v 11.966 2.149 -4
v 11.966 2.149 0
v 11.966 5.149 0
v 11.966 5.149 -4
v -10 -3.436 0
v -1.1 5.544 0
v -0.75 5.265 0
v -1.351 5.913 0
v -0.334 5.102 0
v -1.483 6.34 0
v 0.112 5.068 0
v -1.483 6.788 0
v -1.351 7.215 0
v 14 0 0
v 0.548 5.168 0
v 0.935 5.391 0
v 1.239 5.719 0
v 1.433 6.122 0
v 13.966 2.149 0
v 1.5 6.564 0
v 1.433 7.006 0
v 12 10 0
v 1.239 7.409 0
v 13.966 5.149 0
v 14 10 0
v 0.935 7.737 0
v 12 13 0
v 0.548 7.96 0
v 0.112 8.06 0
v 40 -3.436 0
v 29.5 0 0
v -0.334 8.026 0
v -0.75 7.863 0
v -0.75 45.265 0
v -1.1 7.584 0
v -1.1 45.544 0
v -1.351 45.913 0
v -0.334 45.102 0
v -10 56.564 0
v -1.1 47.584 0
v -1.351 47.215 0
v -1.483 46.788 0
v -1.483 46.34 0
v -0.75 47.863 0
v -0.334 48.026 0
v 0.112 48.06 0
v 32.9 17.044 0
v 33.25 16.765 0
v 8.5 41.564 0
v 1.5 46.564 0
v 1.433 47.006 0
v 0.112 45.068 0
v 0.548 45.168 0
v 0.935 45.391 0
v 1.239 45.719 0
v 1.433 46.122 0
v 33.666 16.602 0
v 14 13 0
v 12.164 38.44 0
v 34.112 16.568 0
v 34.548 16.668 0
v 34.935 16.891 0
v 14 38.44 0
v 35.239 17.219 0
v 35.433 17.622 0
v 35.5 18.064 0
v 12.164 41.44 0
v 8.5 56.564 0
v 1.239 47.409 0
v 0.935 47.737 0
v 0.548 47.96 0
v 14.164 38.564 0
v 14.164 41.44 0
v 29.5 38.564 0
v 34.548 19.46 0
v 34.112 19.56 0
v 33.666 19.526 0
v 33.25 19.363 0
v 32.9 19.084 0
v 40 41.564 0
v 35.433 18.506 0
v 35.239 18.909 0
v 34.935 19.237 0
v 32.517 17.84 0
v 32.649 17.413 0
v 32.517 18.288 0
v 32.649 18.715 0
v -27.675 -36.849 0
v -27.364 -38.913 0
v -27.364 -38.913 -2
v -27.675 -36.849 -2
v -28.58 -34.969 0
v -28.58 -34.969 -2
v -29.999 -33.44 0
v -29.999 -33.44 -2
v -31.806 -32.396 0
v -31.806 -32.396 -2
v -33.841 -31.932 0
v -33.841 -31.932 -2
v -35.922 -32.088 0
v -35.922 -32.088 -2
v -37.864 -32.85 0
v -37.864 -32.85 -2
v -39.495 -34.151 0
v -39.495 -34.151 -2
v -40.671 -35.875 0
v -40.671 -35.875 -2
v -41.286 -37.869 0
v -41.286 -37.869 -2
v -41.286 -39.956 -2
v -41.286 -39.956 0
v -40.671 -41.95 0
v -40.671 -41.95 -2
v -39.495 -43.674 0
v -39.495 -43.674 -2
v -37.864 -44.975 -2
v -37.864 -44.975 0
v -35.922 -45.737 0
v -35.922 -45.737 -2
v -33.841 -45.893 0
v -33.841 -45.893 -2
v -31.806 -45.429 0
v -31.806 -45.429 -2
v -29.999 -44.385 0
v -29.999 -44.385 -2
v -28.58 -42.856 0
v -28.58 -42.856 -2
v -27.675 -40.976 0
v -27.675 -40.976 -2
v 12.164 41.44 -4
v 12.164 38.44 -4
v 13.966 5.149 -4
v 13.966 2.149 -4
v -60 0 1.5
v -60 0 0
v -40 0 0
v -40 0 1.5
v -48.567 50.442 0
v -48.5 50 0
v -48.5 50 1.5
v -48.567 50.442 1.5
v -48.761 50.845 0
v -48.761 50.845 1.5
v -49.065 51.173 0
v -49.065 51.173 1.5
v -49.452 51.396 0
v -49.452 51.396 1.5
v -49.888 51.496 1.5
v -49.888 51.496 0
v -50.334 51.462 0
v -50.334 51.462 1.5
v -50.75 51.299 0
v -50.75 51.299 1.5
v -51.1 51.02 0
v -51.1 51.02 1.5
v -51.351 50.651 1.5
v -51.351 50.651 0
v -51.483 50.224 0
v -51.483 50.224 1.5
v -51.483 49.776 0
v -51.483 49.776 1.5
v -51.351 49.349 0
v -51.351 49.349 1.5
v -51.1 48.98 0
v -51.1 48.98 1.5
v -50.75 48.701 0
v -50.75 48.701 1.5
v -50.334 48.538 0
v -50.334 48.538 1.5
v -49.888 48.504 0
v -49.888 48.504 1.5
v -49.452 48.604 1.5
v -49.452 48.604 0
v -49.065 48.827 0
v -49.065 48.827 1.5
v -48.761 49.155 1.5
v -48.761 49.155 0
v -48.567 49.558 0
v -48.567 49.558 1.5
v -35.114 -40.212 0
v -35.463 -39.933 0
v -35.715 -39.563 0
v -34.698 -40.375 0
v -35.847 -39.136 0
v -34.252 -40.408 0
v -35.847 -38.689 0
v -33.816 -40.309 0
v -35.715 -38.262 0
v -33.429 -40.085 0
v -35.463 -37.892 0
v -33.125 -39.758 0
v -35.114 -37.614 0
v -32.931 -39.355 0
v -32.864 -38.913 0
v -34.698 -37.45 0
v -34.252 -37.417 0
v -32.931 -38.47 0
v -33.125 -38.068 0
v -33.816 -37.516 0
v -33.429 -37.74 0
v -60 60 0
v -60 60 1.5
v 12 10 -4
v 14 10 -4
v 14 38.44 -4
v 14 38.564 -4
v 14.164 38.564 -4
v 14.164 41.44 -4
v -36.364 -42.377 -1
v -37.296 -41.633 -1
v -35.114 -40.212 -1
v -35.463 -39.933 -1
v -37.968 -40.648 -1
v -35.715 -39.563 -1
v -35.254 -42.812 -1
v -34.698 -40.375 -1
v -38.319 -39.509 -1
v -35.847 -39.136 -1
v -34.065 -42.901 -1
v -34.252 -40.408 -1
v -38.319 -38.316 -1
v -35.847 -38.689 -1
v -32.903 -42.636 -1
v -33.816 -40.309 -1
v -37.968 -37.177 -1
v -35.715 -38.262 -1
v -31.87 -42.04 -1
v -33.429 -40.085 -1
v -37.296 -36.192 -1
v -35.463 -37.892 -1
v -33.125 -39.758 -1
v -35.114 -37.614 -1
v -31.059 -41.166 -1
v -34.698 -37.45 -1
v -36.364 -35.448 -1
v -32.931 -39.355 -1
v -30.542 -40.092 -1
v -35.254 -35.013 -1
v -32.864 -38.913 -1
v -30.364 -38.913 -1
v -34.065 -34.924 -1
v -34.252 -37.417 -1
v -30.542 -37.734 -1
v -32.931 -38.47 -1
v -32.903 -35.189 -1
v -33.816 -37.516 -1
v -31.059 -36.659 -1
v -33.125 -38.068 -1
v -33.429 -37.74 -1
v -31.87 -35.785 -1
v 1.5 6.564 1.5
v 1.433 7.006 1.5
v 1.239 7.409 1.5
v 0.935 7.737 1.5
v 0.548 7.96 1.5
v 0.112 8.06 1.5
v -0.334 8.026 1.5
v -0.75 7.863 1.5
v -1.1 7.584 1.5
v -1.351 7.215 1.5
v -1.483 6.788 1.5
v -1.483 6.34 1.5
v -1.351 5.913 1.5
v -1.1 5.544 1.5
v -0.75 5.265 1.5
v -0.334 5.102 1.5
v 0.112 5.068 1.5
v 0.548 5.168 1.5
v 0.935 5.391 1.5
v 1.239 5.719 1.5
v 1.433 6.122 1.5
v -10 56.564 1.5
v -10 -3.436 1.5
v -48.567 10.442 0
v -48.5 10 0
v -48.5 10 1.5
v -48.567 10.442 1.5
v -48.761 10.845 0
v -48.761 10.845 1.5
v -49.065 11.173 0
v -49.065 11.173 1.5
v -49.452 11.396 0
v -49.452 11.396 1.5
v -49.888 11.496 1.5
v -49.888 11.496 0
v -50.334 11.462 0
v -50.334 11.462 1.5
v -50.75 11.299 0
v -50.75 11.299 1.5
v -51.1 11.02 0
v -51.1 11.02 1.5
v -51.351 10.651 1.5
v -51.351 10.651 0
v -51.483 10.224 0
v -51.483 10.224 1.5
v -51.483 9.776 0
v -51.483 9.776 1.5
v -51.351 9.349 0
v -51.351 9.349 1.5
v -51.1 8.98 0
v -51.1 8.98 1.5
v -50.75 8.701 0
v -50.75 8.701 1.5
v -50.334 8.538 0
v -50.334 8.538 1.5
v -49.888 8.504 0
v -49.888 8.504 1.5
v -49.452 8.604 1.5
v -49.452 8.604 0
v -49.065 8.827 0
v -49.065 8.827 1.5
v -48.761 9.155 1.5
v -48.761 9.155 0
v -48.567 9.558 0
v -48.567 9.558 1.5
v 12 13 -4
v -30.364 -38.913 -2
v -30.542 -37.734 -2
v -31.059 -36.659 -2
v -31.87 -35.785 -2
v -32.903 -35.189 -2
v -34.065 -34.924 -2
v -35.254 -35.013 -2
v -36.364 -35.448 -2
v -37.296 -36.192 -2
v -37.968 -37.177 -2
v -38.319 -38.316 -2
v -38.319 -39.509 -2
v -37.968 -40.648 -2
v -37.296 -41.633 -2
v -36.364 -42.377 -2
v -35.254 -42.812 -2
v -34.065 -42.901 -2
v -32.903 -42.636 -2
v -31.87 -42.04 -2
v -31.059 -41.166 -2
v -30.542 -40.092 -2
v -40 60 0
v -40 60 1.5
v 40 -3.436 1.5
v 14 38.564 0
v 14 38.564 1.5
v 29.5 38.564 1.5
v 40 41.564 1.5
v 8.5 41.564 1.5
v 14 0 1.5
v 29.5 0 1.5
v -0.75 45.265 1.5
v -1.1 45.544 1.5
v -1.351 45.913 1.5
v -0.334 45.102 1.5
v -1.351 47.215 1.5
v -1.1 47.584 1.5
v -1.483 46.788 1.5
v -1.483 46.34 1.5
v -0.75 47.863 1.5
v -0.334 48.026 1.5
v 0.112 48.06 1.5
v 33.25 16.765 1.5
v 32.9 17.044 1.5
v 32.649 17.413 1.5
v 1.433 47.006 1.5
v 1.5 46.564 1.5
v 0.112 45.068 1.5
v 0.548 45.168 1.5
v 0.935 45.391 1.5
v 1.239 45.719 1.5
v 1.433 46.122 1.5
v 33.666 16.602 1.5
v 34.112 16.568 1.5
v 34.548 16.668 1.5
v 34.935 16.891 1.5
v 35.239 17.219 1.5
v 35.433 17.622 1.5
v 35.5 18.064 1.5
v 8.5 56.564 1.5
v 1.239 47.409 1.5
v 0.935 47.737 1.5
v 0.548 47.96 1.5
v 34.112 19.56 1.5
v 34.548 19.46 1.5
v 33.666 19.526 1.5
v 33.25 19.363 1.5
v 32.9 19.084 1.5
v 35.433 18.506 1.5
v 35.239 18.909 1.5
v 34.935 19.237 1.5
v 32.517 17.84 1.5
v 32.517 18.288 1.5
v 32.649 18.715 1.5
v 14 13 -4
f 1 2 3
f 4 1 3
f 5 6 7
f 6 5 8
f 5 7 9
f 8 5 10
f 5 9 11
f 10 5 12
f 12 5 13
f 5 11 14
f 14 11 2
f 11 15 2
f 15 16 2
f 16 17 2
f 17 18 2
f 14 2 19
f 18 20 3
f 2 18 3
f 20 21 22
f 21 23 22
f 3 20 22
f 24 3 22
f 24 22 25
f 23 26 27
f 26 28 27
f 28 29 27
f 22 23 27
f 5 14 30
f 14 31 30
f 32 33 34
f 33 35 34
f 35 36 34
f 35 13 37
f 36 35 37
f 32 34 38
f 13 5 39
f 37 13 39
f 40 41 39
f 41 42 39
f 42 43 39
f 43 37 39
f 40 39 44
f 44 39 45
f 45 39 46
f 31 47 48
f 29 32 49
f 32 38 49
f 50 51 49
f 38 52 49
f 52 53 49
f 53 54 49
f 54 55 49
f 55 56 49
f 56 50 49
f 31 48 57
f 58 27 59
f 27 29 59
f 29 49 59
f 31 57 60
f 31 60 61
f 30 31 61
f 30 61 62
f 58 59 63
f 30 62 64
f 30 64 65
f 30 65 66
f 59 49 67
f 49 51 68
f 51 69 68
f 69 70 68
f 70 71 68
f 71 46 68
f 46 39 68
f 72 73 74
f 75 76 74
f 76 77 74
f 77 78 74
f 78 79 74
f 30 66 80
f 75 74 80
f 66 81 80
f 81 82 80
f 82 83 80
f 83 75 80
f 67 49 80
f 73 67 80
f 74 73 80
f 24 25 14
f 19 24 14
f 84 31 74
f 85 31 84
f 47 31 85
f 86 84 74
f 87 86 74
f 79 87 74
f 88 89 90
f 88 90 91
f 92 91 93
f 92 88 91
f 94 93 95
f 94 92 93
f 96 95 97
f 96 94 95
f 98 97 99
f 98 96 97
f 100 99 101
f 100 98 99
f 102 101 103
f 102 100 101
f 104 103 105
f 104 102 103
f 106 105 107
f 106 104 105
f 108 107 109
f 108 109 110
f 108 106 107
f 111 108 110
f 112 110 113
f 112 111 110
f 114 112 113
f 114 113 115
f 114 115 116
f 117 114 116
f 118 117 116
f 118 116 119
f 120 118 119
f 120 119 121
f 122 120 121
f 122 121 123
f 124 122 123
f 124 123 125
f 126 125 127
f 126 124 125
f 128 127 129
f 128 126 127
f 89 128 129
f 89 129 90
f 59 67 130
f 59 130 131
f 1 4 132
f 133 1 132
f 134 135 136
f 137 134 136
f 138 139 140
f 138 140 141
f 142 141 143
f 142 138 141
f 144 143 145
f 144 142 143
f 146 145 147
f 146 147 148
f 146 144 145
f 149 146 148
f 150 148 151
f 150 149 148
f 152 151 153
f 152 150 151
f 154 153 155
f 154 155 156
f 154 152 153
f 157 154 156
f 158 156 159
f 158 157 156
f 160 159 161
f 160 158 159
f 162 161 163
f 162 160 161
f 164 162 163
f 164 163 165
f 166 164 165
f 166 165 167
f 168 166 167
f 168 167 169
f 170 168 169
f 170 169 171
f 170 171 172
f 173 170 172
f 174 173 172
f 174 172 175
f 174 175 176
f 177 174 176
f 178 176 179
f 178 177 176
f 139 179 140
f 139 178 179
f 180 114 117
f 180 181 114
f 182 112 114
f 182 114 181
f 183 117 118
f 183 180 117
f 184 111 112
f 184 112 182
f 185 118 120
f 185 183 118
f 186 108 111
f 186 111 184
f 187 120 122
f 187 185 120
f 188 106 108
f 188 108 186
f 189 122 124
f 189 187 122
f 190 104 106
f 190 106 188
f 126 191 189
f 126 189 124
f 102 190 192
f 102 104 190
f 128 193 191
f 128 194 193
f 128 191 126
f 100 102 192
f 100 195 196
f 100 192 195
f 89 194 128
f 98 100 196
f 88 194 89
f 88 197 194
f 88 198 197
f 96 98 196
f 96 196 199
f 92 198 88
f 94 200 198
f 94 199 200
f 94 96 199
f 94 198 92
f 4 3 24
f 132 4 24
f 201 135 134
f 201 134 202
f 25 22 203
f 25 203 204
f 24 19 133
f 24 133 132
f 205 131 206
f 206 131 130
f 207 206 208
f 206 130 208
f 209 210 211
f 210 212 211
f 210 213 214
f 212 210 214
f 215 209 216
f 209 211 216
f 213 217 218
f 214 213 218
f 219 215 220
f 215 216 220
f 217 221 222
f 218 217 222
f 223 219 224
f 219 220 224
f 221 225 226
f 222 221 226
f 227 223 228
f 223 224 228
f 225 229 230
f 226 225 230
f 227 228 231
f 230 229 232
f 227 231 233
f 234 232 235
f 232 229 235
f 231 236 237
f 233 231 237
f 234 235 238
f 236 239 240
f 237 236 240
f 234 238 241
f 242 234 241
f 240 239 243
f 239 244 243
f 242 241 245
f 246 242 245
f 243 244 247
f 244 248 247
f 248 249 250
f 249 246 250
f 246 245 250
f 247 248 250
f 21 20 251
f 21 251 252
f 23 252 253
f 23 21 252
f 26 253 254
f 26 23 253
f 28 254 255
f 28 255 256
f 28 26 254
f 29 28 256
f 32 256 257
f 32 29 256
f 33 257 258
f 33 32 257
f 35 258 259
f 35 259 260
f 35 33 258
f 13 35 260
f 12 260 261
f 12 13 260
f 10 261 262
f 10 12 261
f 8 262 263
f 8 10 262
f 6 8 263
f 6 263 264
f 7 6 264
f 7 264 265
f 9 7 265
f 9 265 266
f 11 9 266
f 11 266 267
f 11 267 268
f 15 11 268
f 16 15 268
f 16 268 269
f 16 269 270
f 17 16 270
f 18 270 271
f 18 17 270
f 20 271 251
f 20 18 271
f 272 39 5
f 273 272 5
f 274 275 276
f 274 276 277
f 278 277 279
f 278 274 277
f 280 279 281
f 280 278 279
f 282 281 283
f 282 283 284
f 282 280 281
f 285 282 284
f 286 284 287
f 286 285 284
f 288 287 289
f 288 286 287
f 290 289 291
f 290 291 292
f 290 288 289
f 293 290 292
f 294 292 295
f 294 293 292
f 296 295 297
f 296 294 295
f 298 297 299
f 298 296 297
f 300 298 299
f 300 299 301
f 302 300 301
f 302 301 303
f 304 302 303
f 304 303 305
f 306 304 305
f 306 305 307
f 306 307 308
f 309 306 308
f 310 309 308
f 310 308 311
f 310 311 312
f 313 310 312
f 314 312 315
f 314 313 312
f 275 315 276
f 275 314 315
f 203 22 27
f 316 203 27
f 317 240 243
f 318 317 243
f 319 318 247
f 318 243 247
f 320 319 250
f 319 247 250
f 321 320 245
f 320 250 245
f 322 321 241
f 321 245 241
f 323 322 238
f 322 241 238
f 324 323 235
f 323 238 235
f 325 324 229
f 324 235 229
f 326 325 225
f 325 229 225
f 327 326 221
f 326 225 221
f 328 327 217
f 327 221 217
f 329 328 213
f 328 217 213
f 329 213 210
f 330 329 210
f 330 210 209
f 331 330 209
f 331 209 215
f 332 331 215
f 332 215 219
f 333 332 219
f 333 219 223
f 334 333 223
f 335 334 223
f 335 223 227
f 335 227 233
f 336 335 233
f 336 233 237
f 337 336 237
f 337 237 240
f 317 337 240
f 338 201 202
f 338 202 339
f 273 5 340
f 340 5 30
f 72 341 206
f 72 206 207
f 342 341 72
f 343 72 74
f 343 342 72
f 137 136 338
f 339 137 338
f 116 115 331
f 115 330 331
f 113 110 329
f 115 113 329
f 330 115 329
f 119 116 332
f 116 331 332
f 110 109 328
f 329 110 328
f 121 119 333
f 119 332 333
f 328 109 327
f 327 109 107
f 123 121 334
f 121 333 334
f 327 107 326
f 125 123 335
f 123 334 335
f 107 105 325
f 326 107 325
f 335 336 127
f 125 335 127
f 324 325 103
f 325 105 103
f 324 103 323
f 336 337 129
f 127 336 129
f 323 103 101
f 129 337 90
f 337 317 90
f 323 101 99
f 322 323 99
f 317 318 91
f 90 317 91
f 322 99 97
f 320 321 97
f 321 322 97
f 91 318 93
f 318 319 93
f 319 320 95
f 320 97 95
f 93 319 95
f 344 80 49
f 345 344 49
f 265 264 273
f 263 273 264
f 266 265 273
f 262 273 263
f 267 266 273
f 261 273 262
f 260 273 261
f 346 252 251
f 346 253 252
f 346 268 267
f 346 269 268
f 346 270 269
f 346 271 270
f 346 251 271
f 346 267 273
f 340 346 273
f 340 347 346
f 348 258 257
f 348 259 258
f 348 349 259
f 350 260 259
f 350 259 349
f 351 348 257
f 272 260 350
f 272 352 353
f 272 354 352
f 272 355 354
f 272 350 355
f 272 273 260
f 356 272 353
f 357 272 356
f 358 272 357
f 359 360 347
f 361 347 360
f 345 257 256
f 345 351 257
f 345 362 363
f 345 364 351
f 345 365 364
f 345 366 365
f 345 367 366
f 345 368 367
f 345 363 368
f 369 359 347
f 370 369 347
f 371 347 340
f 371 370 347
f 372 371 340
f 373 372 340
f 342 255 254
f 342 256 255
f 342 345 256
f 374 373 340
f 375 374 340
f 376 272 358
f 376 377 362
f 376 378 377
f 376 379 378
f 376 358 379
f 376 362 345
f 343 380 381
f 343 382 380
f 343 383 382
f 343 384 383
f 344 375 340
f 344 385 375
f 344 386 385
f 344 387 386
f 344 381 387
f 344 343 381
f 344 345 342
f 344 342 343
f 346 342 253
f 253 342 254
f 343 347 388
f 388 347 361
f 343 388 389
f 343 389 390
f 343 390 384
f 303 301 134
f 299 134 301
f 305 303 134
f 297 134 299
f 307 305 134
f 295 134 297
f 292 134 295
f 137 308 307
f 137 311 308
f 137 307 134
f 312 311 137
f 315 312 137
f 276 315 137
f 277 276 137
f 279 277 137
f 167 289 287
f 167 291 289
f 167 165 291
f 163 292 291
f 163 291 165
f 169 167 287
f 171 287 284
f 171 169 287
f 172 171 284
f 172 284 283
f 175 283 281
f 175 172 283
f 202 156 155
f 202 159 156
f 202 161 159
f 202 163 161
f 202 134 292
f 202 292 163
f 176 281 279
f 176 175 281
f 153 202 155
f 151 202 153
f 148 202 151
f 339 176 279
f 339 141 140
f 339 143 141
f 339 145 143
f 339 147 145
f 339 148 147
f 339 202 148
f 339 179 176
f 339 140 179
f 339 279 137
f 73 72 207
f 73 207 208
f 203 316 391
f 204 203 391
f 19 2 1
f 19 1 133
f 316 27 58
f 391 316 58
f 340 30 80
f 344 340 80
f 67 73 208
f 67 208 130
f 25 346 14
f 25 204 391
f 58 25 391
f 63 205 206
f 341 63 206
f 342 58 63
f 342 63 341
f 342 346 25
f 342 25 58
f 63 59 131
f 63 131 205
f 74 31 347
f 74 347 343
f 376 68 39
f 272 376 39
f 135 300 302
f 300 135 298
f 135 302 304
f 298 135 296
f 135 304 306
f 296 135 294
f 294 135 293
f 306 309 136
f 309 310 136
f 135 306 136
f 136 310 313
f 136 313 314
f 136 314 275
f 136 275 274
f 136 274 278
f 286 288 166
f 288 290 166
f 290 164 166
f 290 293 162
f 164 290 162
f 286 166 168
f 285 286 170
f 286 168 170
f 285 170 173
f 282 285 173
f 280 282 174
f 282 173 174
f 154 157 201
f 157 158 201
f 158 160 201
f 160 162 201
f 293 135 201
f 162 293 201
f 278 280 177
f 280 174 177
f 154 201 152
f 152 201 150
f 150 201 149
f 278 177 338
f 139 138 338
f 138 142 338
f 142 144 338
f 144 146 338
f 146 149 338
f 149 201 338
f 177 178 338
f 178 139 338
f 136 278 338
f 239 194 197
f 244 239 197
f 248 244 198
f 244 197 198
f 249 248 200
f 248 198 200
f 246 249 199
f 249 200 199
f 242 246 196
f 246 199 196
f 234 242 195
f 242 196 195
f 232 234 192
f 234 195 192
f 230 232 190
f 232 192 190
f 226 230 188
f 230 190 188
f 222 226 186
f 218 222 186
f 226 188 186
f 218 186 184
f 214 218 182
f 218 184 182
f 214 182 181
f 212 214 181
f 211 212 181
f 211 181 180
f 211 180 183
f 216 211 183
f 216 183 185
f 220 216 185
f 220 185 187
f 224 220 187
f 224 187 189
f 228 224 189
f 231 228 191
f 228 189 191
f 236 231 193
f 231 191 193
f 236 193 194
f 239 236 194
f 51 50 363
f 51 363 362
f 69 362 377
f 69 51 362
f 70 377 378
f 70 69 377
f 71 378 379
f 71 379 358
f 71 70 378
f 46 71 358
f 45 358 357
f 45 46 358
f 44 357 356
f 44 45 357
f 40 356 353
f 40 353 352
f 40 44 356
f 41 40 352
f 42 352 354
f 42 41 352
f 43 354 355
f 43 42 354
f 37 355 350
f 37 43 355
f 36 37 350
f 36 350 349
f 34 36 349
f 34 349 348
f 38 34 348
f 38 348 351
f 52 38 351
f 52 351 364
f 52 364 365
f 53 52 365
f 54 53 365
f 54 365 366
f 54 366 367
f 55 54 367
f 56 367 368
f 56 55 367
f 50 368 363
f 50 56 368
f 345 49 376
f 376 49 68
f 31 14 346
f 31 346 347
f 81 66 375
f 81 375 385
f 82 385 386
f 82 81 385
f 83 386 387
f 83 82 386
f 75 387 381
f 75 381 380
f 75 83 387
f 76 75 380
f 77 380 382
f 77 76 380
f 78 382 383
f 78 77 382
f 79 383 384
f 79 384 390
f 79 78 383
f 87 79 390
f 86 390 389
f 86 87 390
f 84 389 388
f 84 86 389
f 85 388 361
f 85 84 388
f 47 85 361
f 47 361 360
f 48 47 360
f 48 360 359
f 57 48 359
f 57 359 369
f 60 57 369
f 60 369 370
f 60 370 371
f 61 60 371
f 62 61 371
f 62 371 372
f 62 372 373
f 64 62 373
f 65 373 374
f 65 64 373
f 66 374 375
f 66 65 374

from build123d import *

# Parameters (mm, degrees)
F1_W      = 20
F1_H      = 60
F1_R      = 1.5
F2_DEPTH  = 1.5
F0_R      = 1.5
F0_W      = 15.5
F0_H      = 38.5640101805
F3_DEPTH  = 1.5
F4_W      = 2
F4_H      = 3
F5_DEPTH  = 4
F6_R      = 4
F6_R_2    = 1.5
F7_DEPTH  = 1
F9_DEPTH  = 1
F6_R_3    = 7
F10_DEPTH = 2


# Not quite as in the source:
# - a feature names something its author has since deleted; it is built from what else it names


with BuildPart() as f2:
    # F1 (on Top) → F2 (new body)
    with BuildSketch(Plane.XY):
        with Locations((-50, 30)):
            Rectangle(F1_W, F1_H)
        with Locations((-50, 10)):
            Circle(F1_R, mode=Mode.SUBTRACT)
        with Locations((-50, 50)):
            Circle(F1_R, mode=Mode.SUBTRACT)
    extrude(amount=F2_DEPTH)


with BuildPart() as f3:
    # F0 (on Top) → F3 (new body)
    with BuildSketch(Plane.XY):
        Polygon((-10, 56.5640101805), (-10, -3.4359898195), (40, -3.4359898195), (40, 41.5640101805), (8.5, 41.5640101805), (8.5, 56.5640101805), align=None)
        with Locations((0, 6.5640101805)):
            Circle(F0_R, mode=Mode.SUBTRACT)
        with Locations((21.75, 19.2820050903)):
            Rectangle(F0_W, F0_H, mode=Mode.SUBTRACT)
        with Locations((34, 18.0640101805)):
            Circle(F0_R, mode=Mode.SUBTRACT)
        with Locations((0, 46.5640101805)):
            Circle(F0_R, mode=Mode.SUBTRACT)
    extrude(amount=F3_DEPTH)

    # F4 (on face) → F5 (join)
    with BuildSketch(Plane.XY):
        with Locations((13, 11.5)):
            Rectangle(F4_W, F4_H)
        with Locations((12.9658896476, 3.6489479244)):
            Rectangle(F4_W, F4_H)
        Polygon((12.1644257344, 38.4399581365), (14, 38.4399581365), (14, 38.5640101805), (14.1644257344, 38.5640101805), (14.1644257344, 41.4399581365), (12.1644257344, 41.4399581365), align=None)
    extrude(amount=-F5_DEPTH)


with BuildPart() as f7:
    # F6 (on Top) → F7 (new body)
    with BuildSketch(Plane.XY):
        with Locations((-34.3638770282, -38.9125682414)):
            Circle(F6_R)
        with Locations((-34.3638770282, -38.9125682414)):
            Circle(F6_R_2, mode=Mode.SUBTRACT)
    extrude(amount=-F7_DEPTH)


with BuildPart() as f9:
    # F6 (on Top) → F9 (new body)
    with BuildSketch(Plane.XY):
        with Locations((-34.3638770282, -38.9125682414)):
            Circle(F6_R)
        with Locations((-34.3638770282, -38.9125682414)):
            Circle(F6_R_2, mode=Mode.SUBTRACT)
    extrude(amount=-F9_DEPTH)

    # F6 (on Top) → F10 (join)
    with BuildSketch(Plane.XY):
        with Locations((-34.3638770282, -38.9125682414)):
            Circle(F6_R_3)
        with Locations((-34.3638770282, -38.9125682414)):
            Circle(F6_R, mode=Mode.SUBTRACT)
    extrude(amount=-F10_DEPTH)


solid = Compound([f2.part, f3.part, f9.part])
